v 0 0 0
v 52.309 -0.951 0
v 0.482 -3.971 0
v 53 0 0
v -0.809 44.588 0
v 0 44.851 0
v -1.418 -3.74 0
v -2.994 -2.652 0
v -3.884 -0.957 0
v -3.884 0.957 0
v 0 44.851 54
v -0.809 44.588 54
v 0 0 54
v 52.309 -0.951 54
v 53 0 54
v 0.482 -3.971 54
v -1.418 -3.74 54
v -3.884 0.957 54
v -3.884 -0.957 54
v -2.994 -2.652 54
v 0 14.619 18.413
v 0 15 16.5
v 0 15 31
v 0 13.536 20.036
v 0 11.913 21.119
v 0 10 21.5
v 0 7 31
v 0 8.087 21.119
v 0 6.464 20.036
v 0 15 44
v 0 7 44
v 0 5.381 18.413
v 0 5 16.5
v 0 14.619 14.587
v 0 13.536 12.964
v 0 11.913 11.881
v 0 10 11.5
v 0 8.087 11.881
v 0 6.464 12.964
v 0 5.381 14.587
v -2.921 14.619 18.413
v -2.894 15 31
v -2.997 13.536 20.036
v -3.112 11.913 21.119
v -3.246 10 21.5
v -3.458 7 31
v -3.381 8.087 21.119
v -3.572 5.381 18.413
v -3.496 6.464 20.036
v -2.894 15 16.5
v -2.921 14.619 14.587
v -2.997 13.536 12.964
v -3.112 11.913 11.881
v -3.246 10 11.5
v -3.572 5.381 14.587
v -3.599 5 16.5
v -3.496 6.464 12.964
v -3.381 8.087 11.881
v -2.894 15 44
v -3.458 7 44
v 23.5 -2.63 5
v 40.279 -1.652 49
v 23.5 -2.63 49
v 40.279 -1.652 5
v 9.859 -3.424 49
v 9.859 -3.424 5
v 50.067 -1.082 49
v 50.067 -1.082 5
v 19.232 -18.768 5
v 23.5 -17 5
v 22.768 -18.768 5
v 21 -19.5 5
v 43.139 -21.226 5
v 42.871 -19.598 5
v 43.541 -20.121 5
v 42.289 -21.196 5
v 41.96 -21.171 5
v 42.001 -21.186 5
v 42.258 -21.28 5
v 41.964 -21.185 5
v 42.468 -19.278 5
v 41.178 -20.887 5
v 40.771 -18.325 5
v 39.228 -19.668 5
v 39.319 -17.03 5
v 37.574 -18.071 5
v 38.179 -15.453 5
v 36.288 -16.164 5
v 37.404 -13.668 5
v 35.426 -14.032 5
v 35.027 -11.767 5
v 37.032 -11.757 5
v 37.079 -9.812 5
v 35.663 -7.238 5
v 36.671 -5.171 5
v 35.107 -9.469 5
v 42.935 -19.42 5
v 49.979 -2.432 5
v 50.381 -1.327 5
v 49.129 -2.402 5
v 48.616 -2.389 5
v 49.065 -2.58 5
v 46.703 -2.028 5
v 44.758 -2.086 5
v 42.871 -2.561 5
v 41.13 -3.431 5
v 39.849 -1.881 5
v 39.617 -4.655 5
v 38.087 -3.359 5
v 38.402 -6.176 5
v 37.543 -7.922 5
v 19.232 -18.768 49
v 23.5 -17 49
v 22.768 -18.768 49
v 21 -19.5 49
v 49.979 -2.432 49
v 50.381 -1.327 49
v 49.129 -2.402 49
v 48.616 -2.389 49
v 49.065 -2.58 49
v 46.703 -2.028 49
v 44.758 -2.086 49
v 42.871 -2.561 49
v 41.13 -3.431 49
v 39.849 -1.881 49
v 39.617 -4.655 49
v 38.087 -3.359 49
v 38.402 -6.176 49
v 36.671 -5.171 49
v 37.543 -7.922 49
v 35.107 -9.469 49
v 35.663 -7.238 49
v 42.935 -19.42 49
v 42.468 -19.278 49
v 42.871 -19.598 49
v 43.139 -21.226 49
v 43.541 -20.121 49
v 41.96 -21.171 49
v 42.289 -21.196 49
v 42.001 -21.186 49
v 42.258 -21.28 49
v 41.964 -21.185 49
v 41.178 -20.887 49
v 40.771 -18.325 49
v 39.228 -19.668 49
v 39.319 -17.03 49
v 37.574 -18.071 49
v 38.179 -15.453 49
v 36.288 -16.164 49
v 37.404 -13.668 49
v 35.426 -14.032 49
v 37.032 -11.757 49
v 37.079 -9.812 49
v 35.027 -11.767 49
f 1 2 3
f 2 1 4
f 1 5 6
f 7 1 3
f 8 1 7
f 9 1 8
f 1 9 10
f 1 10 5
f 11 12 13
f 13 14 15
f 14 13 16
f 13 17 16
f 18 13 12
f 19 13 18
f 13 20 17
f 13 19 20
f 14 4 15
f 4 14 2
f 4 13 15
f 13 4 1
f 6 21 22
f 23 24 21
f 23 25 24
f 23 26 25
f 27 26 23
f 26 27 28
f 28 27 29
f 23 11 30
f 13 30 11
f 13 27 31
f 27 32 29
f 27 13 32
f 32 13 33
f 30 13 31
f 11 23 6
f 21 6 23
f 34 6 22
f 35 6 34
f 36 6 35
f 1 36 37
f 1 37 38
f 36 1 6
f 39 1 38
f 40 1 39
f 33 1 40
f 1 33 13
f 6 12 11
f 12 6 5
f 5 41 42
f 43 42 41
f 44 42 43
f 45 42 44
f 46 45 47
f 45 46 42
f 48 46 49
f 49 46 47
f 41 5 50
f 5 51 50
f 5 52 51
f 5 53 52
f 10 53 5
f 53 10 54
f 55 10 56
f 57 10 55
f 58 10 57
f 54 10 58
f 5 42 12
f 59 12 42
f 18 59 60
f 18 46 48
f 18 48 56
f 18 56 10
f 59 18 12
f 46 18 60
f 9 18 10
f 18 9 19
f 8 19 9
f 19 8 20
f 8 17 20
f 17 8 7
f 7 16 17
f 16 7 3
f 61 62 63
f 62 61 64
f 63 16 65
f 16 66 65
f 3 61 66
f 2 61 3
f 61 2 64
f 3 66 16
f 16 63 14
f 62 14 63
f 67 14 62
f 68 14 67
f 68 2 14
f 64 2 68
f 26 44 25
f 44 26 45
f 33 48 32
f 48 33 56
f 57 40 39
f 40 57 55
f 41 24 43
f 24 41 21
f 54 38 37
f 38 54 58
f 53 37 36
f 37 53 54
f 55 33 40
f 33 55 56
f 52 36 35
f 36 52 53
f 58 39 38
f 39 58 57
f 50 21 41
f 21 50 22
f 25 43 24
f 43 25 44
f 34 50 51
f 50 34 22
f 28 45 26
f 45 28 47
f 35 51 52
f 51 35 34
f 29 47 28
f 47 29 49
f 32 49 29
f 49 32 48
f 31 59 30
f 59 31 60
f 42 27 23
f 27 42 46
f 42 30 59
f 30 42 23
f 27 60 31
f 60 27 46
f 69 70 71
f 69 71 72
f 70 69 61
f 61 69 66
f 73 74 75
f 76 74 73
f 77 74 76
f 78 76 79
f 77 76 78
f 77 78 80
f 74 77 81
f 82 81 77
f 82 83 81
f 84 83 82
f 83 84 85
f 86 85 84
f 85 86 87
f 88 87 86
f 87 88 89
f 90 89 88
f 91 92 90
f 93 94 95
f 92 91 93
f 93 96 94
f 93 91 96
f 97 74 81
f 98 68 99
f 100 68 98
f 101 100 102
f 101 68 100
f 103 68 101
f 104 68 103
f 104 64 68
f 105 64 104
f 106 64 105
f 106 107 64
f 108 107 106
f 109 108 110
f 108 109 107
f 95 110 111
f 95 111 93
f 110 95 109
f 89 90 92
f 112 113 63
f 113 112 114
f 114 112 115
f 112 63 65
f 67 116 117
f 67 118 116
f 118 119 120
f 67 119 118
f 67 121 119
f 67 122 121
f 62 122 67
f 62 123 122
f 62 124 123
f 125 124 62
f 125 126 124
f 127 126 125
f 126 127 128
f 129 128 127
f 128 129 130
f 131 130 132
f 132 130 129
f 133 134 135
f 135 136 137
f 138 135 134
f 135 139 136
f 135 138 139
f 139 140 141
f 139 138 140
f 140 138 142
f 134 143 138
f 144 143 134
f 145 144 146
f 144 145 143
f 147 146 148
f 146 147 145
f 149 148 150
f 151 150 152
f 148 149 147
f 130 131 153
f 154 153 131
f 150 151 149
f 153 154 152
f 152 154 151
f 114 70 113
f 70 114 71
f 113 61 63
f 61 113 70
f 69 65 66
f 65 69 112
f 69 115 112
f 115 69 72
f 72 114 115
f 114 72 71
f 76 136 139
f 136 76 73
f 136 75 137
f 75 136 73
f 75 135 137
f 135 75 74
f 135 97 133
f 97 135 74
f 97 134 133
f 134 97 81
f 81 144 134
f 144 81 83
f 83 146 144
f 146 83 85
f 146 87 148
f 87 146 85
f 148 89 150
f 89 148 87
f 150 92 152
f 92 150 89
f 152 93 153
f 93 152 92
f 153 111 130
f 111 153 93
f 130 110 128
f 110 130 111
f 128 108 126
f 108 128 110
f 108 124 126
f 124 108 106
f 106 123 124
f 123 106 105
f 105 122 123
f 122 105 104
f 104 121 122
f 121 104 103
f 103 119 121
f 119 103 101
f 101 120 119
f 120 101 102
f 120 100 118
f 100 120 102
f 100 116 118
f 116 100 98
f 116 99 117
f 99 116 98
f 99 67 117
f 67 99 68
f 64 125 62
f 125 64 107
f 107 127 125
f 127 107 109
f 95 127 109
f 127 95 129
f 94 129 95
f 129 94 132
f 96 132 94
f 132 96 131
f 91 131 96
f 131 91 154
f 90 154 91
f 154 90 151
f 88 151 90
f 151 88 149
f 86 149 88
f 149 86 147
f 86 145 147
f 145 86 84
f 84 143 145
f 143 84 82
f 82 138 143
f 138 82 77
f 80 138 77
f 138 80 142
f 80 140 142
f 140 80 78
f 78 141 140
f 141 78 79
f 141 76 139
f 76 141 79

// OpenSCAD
/*

I want to combine my Sony SRS X2 Bluetooth speaker and T400 Laptop, because the laptop's speakers
are a little quiet. This clip, adds a little shelf to the top of the screen for the speaker to sit on.

Print Notes :
    Support Type : Touching Build Plate
    Shell THickness : 1.6mm
    Top/Bottom Thickness : 1.6mm
    Infill : 20%
*/


THICKNESS = 1.2;

module seatProfile()
{
    difference() {
        hull() {
            circle( d=8 );
            translate([0,44]) circle( d=2 );
            translate([52,0]) circle( d=2 );
        }
        square( 100 );
    }
}
    
module clipProfile()
{
    // Clip
    d = 22;
    thick = 2;
    
    translate( [46,0,0] ) {
    
        translate( [0,-d/2] ) rotate( 160 ) {
            intersection() {
                difference() {
                    circle( d=d );
                    circle( d=d-thick*2 );
                }
                translate([0,-d]) square( d*3 );
            }    
            translate( [0,d/2-thick/2] ) circle( d=thick );
            translate( [0,- (d/2-thick/2)] ) circle( d=thick );
        }
        
        // Triangular support
        translate([ -25,0]) hull() {
            translate( [0,-17] ) circle( d=5 );
            translate( [-12.5,-THICKNESS] ) square([15,THICKNESS]);
        }
    }
}

module clip()
{
    height = 54;
    z = 5;
    
    difference() {
        linear_extrude( height, convexity=4 ) seatProfile();
        translate([-50,10, -10.5+height/2]) rotate([0,90,0]) cylinder( d=10, h=100 );
        translate([0,11,10.5+height/2]) cube( [100,8,13], center=true ) ;
    }
    
    translate([0,0,z]) linear_extrude( height-z*2 ) clipProfile();
}

clip();
